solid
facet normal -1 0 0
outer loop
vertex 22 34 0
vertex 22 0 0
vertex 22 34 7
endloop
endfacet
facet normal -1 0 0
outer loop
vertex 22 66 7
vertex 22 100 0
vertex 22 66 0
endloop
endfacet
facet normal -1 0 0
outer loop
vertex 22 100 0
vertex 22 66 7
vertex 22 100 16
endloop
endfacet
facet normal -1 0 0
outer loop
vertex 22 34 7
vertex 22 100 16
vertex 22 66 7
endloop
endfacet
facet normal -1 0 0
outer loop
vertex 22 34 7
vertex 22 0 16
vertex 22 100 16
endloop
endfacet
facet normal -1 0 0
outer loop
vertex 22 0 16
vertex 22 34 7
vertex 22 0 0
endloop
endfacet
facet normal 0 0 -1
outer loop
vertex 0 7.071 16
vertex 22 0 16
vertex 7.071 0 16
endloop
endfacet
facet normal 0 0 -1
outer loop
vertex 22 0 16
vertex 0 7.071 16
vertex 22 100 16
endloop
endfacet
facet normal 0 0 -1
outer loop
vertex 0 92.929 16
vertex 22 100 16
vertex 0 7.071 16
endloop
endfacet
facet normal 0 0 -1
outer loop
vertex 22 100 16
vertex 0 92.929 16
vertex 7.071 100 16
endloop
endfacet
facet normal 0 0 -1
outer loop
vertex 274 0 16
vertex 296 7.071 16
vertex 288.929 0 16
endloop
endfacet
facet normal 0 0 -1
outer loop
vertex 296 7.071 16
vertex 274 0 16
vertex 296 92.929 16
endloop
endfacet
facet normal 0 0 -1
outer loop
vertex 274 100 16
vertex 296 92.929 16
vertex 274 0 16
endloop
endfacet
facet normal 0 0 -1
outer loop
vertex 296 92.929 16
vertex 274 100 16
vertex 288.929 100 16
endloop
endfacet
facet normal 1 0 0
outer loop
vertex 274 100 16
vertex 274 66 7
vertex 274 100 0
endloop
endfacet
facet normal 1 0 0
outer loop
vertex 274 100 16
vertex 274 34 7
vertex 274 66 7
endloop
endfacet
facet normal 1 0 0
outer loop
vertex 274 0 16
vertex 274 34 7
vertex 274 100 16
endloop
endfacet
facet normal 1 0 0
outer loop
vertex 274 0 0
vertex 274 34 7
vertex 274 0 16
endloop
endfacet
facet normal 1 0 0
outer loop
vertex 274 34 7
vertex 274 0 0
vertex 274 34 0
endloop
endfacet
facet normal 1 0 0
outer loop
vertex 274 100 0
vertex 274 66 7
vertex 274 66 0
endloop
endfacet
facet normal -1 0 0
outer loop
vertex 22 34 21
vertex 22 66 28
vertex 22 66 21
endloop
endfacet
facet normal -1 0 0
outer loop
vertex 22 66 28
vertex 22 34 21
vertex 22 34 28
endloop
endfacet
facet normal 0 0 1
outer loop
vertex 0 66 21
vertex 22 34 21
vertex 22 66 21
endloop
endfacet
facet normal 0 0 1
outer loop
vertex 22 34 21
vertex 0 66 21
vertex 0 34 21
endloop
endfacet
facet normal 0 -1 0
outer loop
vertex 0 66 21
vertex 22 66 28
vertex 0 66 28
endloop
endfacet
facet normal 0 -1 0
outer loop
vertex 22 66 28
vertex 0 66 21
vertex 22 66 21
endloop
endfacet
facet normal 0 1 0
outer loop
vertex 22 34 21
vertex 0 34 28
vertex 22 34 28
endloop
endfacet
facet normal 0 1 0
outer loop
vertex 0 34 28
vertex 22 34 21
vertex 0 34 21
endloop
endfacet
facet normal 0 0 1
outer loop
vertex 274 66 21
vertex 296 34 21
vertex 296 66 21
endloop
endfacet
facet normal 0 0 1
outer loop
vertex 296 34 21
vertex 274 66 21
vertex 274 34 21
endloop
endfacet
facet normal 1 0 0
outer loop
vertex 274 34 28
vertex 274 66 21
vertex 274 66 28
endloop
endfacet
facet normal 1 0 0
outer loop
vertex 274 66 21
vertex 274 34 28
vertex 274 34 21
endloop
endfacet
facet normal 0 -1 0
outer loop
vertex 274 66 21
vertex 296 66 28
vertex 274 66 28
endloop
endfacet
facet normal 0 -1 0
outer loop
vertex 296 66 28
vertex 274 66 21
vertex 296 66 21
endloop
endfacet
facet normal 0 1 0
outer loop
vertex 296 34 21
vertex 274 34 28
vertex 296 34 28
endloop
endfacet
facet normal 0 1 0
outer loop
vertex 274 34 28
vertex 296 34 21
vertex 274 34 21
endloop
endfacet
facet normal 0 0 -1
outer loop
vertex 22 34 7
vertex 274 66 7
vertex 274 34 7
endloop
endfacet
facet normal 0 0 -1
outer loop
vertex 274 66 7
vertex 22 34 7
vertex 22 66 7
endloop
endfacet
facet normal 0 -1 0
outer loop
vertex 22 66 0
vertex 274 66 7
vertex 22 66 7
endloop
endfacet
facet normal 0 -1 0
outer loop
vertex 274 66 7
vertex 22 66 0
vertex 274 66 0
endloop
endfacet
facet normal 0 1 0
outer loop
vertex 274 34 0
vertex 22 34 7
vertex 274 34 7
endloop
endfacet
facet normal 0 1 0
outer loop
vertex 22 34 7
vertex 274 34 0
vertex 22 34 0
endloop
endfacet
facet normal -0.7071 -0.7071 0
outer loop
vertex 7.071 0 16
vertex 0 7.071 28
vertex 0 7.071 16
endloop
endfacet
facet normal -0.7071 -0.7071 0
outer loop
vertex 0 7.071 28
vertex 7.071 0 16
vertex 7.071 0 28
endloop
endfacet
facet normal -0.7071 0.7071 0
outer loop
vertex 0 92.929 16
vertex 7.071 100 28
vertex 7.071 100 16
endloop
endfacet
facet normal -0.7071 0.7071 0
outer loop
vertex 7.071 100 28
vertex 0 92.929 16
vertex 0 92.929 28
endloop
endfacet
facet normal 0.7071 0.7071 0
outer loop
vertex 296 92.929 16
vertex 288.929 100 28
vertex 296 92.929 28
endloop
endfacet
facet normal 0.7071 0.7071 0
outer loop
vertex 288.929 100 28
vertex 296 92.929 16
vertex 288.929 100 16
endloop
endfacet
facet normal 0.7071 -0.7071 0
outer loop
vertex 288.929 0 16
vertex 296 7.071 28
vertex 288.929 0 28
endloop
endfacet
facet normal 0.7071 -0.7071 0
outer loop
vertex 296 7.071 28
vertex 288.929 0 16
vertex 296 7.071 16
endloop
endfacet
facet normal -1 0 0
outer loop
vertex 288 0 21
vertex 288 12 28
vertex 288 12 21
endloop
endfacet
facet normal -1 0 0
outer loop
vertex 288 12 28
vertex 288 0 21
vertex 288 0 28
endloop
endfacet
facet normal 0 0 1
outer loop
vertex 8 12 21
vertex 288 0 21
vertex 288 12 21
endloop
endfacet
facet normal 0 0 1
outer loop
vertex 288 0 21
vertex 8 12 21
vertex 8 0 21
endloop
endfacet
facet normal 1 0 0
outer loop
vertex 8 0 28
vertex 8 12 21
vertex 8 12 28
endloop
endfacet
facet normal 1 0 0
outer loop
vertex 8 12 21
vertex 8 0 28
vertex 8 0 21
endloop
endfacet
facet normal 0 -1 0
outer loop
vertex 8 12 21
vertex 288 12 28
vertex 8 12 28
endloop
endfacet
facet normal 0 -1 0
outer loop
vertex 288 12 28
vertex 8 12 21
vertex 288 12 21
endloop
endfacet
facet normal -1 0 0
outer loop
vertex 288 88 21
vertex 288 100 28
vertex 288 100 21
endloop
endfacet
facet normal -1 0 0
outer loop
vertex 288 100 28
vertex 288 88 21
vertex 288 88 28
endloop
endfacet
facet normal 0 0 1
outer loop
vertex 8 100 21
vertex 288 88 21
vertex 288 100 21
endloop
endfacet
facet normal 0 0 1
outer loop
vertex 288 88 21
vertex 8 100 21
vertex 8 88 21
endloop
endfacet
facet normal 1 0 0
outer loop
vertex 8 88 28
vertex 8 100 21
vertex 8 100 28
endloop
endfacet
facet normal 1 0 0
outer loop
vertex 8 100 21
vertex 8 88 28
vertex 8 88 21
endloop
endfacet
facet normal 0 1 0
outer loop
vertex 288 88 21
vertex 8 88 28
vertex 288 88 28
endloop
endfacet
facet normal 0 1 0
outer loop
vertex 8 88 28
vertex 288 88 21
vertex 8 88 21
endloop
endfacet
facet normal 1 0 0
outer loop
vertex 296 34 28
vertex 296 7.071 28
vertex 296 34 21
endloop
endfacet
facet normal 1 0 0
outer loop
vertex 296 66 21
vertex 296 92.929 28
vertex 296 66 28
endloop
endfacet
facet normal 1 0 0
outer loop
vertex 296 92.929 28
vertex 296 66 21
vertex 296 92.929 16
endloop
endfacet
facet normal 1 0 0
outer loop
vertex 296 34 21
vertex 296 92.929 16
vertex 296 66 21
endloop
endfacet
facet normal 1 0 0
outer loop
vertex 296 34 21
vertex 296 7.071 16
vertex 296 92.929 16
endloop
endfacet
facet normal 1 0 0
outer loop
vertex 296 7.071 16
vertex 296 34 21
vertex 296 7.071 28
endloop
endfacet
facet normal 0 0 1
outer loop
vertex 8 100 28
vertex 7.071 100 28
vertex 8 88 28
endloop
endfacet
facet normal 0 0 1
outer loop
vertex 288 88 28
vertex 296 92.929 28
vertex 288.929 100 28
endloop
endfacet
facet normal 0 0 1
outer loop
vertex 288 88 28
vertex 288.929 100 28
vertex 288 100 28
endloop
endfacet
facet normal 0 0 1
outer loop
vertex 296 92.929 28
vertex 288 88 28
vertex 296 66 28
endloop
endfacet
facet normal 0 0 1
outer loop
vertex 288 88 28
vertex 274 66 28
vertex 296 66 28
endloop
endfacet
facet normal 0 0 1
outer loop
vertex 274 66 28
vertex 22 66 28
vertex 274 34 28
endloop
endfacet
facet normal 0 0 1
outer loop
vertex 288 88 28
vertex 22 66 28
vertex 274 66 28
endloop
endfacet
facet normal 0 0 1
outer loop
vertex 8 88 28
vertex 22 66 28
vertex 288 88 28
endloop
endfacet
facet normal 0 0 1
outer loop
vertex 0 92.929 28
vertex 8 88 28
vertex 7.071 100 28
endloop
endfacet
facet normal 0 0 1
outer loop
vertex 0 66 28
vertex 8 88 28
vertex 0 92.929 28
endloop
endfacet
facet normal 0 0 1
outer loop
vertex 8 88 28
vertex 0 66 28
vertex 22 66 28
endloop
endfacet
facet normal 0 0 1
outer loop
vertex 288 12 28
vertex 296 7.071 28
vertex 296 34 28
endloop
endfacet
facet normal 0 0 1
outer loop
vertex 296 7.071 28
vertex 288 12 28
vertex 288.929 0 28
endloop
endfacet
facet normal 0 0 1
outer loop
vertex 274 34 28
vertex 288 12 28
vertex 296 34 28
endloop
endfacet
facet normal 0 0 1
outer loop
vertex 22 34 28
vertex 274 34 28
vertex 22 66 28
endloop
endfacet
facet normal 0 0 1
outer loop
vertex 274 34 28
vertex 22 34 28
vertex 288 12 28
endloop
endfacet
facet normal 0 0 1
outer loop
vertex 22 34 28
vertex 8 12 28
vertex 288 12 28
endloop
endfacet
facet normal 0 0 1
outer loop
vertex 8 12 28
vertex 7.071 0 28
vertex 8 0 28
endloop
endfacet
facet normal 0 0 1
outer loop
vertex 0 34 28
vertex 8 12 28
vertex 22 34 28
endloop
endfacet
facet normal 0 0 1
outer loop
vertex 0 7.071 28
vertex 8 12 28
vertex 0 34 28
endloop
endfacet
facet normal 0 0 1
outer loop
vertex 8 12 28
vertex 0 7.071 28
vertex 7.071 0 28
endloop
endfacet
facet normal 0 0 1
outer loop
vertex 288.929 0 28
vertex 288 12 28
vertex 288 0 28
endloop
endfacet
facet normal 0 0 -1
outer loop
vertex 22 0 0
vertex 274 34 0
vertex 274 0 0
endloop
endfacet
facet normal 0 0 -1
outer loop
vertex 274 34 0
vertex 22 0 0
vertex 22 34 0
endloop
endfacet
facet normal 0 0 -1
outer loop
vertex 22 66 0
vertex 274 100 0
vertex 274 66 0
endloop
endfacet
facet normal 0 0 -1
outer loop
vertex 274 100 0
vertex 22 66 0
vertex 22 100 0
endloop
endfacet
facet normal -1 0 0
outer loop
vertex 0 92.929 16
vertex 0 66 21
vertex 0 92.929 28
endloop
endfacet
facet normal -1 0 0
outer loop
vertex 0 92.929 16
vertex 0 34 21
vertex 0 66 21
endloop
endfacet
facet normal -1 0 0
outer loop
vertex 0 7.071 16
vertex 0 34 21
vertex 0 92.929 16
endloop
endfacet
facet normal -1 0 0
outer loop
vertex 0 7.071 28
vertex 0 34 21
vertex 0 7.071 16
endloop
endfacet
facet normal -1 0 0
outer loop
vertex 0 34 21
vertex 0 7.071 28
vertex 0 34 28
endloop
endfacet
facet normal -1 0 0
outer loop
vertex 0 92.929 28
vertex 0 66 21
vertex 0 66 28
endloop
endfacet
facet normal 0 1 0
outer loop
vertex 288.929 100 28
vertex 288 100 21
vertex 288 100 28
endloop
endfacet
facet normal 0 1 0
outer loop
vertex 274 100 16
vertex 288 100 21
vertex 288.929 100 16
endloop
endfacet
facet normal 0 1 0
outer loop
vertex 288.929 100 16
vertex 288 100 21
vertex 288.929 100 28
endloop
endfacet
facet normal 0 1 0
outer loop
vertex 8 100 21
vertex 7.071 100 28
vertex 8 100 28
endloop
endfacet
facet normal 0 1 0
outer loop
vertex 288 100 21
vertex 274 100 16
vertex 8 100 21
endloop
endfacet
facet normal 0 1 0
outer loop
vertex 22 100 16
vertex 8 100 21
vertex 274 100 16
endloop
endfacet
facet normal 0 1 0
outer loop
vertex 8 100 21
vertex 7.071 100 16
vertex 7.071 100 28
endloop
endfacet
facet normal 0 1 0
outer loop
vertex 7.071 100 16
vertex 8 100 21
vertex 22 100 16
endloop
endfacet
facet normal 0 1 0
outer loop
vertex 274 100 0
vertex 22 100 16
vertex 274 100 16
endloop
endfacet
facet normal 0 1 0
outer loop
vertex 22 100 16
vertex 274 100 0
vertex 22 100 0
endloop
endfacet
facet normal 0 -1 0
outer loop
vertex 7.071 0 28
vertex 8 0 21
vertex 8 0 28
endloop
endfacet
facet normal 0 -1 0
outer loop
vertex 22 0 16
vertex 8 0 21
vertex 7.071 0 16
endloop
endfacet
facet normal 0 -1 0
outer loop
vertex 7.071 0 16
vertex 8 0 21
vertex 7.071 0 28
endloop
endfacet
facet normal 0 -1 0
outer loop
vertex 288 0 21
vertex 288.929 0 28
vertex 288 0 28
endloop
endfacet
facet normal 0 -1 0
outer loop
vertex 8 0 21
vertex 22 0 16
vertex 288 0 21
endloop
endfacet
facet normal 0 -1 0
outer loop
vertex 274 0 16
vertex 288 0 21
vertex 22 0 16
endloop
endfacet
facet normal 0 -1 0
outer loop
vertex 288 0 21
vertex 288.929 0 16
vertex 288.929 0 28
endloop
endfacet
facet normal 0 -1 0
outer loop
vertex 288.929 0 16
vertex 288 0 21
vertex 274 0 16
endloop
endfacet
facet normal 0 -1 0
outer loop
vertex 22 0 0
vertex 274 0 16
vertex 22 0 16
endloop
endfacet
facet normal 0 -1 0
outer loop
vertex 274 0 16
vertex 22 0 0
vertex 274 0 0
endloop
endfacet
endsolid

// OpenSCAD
include <../src/wardrobe.scad>;
plank_yx_middle_bottom();
//github_openscad -o wardrobe_1/plank_yx_middle_bottom.stl -D wardrobe_n=1 -D cutting_edge=0 -D break_view_length=0 wardrobe_1/plank_yx_middle_bottom_stl.scad
